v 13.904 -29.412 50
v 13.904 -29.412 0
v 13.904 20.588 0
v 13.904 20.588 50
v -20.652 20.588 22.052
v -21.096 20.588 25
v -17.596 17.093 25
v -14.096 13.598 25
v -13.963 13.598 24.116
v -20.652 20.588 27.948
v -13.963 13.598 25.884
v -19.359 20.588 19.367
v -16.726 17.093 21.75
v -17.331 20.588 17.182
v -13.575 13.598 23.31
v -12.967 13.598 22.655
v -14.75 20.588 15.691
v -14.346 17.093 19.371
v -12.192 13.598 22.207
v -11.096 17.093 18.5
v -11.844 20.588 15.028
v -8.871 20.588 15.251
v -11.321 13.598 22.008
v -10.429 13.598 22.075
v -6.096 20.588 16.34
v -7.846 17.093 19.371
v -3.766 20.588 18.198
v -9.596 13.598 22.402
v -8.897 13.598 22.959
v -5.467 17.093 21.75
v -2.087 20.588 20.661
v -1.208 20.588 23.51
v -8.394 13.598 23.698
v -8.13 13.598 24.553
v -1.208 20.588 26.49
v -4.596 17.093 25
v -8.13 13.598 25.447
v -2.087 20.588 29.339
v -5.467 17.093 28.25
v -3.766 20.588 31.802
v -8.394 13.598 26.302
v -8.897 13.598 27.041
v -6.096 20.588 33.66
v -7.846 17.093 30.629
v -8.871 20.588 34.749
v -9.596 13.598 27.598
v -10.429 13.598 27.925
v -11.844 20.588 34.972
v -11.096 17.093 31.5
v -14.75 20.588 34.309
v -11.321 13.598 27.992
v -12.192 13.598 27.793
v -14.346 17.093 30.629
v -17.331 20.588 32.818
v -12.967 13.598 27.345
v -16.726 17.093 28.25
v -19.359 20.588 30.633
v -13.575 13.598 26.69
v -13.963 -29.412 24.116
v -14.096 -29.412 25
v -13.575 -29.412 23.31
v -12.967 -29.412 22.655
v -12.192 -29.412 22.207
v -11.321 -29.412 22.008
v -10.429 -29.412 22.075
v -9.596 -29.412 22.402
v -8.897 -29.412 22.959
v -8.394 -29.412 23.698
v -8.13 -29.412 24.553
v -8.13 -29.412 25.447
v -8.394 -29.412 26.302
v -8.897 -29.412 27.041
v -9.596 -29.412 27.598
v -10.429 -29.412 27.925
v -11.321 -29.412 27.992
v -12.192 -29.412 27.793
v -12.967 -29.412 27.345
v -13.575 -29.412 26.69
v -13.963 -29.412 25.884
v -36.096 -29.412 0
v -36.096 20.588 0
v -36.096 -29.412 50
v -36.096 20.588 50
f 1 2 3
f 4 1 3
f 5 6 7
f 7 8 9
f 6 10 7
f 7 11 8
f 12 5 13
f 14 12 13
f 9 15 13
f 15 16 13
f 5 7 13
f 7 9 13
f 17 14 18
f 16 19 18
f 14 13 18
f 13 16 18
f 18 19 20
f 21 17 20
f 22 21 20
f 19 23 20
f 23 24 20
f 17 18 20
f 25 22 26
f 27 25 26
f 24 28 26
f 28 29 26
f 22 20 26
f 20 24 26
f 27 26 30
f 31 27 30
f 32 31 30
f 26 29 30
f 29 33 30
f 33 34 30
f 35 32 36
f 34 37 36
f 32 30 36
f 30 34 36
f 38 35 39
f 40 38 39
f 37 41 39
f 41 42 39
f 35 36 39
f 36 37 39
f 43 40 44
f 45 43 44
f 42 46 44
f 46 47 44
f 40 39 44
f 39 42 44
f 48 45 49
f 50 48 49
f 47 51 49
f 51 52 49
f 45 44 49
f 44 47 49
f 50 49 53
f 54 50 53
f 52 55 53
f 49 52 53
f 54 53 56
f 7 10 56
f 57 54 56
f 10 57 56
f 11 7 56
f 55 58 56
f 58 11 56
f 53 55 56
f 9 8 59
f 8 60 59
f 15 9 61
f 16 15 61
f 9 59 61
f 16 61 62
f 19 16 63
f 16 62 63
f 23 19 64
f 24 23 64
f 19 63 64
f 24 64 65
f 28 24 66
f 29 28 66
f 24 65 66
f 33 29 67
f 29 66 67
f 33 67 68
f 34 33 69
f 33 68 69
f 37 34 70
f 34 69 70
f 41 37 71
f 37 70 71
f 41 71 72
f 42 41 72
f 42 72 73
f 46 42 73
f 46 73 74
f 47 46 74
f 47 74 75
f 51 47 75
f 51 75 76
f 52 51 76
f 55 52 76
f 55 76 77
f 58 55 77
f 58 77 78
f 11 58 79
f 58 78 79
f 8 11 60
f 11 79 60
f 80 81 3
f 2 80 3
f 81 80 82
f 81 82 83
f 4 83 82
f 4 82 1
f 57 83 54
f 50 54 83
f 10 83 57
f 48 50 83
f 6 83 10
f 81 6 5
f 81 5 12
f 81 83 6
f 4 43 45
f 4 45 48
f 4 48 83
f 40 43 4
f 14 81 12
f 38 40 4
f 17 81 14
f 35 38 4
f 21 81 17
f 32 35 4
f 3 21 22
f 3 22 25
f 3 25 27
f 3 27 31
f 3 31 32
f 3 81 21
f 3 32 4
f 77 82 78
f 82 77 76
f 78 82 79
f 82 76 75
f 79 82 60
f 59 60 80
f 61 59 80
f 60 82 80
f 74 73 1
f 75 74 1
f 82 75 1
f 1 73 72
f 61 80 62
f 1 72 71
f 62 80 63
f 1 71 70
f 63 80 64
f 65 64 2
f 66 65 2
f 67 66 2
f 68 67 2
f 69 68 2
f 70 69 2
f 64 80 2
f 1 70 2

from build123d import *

# Parameters (mm, degrees)
SKETCH_1_W      = 50
SKETCH_1_H      = 50
EXTRUDE_1_DEPTH = 50


with BuildPart() as part:
    # 草图1 → 凸台-拉伸1 (new body)
    with BuildSketch(Plane.XY):
        with Locations((-11.096434238, -4.411764706)):
            Rectangle(SKETCH_1_W, SKETCH_1_H)
    extrude(amount=EXTRUDE_1_DEPTH)

    # 草图3 → 切除-旋转1 (revolve, cut)
    with BuildSketch(Plane(origin=(-11.096434238, 0, 0), x_dir=(0, 0, -1), z_dir=(1, 0, 0)), mode=Mode.PRIVATE) as cut_revolve_1_sk:
        Polygon((-25, 20.588235294), (-35, 20.588235294), (-28, 13.598319189), (-28, -29.411764706), (-25, -29.411764706), align=None)
    revolve(cut_revolve_1_sk.sketch.rotate(Axis((-11.096434238, 20.588235294, 25), (0, -1, 0)), 90), axis=Axis((-11.096434238, 20.588235294, 25), (0, -1, 0)), mode=Mode.SUBTRACT)


solid = part.part
